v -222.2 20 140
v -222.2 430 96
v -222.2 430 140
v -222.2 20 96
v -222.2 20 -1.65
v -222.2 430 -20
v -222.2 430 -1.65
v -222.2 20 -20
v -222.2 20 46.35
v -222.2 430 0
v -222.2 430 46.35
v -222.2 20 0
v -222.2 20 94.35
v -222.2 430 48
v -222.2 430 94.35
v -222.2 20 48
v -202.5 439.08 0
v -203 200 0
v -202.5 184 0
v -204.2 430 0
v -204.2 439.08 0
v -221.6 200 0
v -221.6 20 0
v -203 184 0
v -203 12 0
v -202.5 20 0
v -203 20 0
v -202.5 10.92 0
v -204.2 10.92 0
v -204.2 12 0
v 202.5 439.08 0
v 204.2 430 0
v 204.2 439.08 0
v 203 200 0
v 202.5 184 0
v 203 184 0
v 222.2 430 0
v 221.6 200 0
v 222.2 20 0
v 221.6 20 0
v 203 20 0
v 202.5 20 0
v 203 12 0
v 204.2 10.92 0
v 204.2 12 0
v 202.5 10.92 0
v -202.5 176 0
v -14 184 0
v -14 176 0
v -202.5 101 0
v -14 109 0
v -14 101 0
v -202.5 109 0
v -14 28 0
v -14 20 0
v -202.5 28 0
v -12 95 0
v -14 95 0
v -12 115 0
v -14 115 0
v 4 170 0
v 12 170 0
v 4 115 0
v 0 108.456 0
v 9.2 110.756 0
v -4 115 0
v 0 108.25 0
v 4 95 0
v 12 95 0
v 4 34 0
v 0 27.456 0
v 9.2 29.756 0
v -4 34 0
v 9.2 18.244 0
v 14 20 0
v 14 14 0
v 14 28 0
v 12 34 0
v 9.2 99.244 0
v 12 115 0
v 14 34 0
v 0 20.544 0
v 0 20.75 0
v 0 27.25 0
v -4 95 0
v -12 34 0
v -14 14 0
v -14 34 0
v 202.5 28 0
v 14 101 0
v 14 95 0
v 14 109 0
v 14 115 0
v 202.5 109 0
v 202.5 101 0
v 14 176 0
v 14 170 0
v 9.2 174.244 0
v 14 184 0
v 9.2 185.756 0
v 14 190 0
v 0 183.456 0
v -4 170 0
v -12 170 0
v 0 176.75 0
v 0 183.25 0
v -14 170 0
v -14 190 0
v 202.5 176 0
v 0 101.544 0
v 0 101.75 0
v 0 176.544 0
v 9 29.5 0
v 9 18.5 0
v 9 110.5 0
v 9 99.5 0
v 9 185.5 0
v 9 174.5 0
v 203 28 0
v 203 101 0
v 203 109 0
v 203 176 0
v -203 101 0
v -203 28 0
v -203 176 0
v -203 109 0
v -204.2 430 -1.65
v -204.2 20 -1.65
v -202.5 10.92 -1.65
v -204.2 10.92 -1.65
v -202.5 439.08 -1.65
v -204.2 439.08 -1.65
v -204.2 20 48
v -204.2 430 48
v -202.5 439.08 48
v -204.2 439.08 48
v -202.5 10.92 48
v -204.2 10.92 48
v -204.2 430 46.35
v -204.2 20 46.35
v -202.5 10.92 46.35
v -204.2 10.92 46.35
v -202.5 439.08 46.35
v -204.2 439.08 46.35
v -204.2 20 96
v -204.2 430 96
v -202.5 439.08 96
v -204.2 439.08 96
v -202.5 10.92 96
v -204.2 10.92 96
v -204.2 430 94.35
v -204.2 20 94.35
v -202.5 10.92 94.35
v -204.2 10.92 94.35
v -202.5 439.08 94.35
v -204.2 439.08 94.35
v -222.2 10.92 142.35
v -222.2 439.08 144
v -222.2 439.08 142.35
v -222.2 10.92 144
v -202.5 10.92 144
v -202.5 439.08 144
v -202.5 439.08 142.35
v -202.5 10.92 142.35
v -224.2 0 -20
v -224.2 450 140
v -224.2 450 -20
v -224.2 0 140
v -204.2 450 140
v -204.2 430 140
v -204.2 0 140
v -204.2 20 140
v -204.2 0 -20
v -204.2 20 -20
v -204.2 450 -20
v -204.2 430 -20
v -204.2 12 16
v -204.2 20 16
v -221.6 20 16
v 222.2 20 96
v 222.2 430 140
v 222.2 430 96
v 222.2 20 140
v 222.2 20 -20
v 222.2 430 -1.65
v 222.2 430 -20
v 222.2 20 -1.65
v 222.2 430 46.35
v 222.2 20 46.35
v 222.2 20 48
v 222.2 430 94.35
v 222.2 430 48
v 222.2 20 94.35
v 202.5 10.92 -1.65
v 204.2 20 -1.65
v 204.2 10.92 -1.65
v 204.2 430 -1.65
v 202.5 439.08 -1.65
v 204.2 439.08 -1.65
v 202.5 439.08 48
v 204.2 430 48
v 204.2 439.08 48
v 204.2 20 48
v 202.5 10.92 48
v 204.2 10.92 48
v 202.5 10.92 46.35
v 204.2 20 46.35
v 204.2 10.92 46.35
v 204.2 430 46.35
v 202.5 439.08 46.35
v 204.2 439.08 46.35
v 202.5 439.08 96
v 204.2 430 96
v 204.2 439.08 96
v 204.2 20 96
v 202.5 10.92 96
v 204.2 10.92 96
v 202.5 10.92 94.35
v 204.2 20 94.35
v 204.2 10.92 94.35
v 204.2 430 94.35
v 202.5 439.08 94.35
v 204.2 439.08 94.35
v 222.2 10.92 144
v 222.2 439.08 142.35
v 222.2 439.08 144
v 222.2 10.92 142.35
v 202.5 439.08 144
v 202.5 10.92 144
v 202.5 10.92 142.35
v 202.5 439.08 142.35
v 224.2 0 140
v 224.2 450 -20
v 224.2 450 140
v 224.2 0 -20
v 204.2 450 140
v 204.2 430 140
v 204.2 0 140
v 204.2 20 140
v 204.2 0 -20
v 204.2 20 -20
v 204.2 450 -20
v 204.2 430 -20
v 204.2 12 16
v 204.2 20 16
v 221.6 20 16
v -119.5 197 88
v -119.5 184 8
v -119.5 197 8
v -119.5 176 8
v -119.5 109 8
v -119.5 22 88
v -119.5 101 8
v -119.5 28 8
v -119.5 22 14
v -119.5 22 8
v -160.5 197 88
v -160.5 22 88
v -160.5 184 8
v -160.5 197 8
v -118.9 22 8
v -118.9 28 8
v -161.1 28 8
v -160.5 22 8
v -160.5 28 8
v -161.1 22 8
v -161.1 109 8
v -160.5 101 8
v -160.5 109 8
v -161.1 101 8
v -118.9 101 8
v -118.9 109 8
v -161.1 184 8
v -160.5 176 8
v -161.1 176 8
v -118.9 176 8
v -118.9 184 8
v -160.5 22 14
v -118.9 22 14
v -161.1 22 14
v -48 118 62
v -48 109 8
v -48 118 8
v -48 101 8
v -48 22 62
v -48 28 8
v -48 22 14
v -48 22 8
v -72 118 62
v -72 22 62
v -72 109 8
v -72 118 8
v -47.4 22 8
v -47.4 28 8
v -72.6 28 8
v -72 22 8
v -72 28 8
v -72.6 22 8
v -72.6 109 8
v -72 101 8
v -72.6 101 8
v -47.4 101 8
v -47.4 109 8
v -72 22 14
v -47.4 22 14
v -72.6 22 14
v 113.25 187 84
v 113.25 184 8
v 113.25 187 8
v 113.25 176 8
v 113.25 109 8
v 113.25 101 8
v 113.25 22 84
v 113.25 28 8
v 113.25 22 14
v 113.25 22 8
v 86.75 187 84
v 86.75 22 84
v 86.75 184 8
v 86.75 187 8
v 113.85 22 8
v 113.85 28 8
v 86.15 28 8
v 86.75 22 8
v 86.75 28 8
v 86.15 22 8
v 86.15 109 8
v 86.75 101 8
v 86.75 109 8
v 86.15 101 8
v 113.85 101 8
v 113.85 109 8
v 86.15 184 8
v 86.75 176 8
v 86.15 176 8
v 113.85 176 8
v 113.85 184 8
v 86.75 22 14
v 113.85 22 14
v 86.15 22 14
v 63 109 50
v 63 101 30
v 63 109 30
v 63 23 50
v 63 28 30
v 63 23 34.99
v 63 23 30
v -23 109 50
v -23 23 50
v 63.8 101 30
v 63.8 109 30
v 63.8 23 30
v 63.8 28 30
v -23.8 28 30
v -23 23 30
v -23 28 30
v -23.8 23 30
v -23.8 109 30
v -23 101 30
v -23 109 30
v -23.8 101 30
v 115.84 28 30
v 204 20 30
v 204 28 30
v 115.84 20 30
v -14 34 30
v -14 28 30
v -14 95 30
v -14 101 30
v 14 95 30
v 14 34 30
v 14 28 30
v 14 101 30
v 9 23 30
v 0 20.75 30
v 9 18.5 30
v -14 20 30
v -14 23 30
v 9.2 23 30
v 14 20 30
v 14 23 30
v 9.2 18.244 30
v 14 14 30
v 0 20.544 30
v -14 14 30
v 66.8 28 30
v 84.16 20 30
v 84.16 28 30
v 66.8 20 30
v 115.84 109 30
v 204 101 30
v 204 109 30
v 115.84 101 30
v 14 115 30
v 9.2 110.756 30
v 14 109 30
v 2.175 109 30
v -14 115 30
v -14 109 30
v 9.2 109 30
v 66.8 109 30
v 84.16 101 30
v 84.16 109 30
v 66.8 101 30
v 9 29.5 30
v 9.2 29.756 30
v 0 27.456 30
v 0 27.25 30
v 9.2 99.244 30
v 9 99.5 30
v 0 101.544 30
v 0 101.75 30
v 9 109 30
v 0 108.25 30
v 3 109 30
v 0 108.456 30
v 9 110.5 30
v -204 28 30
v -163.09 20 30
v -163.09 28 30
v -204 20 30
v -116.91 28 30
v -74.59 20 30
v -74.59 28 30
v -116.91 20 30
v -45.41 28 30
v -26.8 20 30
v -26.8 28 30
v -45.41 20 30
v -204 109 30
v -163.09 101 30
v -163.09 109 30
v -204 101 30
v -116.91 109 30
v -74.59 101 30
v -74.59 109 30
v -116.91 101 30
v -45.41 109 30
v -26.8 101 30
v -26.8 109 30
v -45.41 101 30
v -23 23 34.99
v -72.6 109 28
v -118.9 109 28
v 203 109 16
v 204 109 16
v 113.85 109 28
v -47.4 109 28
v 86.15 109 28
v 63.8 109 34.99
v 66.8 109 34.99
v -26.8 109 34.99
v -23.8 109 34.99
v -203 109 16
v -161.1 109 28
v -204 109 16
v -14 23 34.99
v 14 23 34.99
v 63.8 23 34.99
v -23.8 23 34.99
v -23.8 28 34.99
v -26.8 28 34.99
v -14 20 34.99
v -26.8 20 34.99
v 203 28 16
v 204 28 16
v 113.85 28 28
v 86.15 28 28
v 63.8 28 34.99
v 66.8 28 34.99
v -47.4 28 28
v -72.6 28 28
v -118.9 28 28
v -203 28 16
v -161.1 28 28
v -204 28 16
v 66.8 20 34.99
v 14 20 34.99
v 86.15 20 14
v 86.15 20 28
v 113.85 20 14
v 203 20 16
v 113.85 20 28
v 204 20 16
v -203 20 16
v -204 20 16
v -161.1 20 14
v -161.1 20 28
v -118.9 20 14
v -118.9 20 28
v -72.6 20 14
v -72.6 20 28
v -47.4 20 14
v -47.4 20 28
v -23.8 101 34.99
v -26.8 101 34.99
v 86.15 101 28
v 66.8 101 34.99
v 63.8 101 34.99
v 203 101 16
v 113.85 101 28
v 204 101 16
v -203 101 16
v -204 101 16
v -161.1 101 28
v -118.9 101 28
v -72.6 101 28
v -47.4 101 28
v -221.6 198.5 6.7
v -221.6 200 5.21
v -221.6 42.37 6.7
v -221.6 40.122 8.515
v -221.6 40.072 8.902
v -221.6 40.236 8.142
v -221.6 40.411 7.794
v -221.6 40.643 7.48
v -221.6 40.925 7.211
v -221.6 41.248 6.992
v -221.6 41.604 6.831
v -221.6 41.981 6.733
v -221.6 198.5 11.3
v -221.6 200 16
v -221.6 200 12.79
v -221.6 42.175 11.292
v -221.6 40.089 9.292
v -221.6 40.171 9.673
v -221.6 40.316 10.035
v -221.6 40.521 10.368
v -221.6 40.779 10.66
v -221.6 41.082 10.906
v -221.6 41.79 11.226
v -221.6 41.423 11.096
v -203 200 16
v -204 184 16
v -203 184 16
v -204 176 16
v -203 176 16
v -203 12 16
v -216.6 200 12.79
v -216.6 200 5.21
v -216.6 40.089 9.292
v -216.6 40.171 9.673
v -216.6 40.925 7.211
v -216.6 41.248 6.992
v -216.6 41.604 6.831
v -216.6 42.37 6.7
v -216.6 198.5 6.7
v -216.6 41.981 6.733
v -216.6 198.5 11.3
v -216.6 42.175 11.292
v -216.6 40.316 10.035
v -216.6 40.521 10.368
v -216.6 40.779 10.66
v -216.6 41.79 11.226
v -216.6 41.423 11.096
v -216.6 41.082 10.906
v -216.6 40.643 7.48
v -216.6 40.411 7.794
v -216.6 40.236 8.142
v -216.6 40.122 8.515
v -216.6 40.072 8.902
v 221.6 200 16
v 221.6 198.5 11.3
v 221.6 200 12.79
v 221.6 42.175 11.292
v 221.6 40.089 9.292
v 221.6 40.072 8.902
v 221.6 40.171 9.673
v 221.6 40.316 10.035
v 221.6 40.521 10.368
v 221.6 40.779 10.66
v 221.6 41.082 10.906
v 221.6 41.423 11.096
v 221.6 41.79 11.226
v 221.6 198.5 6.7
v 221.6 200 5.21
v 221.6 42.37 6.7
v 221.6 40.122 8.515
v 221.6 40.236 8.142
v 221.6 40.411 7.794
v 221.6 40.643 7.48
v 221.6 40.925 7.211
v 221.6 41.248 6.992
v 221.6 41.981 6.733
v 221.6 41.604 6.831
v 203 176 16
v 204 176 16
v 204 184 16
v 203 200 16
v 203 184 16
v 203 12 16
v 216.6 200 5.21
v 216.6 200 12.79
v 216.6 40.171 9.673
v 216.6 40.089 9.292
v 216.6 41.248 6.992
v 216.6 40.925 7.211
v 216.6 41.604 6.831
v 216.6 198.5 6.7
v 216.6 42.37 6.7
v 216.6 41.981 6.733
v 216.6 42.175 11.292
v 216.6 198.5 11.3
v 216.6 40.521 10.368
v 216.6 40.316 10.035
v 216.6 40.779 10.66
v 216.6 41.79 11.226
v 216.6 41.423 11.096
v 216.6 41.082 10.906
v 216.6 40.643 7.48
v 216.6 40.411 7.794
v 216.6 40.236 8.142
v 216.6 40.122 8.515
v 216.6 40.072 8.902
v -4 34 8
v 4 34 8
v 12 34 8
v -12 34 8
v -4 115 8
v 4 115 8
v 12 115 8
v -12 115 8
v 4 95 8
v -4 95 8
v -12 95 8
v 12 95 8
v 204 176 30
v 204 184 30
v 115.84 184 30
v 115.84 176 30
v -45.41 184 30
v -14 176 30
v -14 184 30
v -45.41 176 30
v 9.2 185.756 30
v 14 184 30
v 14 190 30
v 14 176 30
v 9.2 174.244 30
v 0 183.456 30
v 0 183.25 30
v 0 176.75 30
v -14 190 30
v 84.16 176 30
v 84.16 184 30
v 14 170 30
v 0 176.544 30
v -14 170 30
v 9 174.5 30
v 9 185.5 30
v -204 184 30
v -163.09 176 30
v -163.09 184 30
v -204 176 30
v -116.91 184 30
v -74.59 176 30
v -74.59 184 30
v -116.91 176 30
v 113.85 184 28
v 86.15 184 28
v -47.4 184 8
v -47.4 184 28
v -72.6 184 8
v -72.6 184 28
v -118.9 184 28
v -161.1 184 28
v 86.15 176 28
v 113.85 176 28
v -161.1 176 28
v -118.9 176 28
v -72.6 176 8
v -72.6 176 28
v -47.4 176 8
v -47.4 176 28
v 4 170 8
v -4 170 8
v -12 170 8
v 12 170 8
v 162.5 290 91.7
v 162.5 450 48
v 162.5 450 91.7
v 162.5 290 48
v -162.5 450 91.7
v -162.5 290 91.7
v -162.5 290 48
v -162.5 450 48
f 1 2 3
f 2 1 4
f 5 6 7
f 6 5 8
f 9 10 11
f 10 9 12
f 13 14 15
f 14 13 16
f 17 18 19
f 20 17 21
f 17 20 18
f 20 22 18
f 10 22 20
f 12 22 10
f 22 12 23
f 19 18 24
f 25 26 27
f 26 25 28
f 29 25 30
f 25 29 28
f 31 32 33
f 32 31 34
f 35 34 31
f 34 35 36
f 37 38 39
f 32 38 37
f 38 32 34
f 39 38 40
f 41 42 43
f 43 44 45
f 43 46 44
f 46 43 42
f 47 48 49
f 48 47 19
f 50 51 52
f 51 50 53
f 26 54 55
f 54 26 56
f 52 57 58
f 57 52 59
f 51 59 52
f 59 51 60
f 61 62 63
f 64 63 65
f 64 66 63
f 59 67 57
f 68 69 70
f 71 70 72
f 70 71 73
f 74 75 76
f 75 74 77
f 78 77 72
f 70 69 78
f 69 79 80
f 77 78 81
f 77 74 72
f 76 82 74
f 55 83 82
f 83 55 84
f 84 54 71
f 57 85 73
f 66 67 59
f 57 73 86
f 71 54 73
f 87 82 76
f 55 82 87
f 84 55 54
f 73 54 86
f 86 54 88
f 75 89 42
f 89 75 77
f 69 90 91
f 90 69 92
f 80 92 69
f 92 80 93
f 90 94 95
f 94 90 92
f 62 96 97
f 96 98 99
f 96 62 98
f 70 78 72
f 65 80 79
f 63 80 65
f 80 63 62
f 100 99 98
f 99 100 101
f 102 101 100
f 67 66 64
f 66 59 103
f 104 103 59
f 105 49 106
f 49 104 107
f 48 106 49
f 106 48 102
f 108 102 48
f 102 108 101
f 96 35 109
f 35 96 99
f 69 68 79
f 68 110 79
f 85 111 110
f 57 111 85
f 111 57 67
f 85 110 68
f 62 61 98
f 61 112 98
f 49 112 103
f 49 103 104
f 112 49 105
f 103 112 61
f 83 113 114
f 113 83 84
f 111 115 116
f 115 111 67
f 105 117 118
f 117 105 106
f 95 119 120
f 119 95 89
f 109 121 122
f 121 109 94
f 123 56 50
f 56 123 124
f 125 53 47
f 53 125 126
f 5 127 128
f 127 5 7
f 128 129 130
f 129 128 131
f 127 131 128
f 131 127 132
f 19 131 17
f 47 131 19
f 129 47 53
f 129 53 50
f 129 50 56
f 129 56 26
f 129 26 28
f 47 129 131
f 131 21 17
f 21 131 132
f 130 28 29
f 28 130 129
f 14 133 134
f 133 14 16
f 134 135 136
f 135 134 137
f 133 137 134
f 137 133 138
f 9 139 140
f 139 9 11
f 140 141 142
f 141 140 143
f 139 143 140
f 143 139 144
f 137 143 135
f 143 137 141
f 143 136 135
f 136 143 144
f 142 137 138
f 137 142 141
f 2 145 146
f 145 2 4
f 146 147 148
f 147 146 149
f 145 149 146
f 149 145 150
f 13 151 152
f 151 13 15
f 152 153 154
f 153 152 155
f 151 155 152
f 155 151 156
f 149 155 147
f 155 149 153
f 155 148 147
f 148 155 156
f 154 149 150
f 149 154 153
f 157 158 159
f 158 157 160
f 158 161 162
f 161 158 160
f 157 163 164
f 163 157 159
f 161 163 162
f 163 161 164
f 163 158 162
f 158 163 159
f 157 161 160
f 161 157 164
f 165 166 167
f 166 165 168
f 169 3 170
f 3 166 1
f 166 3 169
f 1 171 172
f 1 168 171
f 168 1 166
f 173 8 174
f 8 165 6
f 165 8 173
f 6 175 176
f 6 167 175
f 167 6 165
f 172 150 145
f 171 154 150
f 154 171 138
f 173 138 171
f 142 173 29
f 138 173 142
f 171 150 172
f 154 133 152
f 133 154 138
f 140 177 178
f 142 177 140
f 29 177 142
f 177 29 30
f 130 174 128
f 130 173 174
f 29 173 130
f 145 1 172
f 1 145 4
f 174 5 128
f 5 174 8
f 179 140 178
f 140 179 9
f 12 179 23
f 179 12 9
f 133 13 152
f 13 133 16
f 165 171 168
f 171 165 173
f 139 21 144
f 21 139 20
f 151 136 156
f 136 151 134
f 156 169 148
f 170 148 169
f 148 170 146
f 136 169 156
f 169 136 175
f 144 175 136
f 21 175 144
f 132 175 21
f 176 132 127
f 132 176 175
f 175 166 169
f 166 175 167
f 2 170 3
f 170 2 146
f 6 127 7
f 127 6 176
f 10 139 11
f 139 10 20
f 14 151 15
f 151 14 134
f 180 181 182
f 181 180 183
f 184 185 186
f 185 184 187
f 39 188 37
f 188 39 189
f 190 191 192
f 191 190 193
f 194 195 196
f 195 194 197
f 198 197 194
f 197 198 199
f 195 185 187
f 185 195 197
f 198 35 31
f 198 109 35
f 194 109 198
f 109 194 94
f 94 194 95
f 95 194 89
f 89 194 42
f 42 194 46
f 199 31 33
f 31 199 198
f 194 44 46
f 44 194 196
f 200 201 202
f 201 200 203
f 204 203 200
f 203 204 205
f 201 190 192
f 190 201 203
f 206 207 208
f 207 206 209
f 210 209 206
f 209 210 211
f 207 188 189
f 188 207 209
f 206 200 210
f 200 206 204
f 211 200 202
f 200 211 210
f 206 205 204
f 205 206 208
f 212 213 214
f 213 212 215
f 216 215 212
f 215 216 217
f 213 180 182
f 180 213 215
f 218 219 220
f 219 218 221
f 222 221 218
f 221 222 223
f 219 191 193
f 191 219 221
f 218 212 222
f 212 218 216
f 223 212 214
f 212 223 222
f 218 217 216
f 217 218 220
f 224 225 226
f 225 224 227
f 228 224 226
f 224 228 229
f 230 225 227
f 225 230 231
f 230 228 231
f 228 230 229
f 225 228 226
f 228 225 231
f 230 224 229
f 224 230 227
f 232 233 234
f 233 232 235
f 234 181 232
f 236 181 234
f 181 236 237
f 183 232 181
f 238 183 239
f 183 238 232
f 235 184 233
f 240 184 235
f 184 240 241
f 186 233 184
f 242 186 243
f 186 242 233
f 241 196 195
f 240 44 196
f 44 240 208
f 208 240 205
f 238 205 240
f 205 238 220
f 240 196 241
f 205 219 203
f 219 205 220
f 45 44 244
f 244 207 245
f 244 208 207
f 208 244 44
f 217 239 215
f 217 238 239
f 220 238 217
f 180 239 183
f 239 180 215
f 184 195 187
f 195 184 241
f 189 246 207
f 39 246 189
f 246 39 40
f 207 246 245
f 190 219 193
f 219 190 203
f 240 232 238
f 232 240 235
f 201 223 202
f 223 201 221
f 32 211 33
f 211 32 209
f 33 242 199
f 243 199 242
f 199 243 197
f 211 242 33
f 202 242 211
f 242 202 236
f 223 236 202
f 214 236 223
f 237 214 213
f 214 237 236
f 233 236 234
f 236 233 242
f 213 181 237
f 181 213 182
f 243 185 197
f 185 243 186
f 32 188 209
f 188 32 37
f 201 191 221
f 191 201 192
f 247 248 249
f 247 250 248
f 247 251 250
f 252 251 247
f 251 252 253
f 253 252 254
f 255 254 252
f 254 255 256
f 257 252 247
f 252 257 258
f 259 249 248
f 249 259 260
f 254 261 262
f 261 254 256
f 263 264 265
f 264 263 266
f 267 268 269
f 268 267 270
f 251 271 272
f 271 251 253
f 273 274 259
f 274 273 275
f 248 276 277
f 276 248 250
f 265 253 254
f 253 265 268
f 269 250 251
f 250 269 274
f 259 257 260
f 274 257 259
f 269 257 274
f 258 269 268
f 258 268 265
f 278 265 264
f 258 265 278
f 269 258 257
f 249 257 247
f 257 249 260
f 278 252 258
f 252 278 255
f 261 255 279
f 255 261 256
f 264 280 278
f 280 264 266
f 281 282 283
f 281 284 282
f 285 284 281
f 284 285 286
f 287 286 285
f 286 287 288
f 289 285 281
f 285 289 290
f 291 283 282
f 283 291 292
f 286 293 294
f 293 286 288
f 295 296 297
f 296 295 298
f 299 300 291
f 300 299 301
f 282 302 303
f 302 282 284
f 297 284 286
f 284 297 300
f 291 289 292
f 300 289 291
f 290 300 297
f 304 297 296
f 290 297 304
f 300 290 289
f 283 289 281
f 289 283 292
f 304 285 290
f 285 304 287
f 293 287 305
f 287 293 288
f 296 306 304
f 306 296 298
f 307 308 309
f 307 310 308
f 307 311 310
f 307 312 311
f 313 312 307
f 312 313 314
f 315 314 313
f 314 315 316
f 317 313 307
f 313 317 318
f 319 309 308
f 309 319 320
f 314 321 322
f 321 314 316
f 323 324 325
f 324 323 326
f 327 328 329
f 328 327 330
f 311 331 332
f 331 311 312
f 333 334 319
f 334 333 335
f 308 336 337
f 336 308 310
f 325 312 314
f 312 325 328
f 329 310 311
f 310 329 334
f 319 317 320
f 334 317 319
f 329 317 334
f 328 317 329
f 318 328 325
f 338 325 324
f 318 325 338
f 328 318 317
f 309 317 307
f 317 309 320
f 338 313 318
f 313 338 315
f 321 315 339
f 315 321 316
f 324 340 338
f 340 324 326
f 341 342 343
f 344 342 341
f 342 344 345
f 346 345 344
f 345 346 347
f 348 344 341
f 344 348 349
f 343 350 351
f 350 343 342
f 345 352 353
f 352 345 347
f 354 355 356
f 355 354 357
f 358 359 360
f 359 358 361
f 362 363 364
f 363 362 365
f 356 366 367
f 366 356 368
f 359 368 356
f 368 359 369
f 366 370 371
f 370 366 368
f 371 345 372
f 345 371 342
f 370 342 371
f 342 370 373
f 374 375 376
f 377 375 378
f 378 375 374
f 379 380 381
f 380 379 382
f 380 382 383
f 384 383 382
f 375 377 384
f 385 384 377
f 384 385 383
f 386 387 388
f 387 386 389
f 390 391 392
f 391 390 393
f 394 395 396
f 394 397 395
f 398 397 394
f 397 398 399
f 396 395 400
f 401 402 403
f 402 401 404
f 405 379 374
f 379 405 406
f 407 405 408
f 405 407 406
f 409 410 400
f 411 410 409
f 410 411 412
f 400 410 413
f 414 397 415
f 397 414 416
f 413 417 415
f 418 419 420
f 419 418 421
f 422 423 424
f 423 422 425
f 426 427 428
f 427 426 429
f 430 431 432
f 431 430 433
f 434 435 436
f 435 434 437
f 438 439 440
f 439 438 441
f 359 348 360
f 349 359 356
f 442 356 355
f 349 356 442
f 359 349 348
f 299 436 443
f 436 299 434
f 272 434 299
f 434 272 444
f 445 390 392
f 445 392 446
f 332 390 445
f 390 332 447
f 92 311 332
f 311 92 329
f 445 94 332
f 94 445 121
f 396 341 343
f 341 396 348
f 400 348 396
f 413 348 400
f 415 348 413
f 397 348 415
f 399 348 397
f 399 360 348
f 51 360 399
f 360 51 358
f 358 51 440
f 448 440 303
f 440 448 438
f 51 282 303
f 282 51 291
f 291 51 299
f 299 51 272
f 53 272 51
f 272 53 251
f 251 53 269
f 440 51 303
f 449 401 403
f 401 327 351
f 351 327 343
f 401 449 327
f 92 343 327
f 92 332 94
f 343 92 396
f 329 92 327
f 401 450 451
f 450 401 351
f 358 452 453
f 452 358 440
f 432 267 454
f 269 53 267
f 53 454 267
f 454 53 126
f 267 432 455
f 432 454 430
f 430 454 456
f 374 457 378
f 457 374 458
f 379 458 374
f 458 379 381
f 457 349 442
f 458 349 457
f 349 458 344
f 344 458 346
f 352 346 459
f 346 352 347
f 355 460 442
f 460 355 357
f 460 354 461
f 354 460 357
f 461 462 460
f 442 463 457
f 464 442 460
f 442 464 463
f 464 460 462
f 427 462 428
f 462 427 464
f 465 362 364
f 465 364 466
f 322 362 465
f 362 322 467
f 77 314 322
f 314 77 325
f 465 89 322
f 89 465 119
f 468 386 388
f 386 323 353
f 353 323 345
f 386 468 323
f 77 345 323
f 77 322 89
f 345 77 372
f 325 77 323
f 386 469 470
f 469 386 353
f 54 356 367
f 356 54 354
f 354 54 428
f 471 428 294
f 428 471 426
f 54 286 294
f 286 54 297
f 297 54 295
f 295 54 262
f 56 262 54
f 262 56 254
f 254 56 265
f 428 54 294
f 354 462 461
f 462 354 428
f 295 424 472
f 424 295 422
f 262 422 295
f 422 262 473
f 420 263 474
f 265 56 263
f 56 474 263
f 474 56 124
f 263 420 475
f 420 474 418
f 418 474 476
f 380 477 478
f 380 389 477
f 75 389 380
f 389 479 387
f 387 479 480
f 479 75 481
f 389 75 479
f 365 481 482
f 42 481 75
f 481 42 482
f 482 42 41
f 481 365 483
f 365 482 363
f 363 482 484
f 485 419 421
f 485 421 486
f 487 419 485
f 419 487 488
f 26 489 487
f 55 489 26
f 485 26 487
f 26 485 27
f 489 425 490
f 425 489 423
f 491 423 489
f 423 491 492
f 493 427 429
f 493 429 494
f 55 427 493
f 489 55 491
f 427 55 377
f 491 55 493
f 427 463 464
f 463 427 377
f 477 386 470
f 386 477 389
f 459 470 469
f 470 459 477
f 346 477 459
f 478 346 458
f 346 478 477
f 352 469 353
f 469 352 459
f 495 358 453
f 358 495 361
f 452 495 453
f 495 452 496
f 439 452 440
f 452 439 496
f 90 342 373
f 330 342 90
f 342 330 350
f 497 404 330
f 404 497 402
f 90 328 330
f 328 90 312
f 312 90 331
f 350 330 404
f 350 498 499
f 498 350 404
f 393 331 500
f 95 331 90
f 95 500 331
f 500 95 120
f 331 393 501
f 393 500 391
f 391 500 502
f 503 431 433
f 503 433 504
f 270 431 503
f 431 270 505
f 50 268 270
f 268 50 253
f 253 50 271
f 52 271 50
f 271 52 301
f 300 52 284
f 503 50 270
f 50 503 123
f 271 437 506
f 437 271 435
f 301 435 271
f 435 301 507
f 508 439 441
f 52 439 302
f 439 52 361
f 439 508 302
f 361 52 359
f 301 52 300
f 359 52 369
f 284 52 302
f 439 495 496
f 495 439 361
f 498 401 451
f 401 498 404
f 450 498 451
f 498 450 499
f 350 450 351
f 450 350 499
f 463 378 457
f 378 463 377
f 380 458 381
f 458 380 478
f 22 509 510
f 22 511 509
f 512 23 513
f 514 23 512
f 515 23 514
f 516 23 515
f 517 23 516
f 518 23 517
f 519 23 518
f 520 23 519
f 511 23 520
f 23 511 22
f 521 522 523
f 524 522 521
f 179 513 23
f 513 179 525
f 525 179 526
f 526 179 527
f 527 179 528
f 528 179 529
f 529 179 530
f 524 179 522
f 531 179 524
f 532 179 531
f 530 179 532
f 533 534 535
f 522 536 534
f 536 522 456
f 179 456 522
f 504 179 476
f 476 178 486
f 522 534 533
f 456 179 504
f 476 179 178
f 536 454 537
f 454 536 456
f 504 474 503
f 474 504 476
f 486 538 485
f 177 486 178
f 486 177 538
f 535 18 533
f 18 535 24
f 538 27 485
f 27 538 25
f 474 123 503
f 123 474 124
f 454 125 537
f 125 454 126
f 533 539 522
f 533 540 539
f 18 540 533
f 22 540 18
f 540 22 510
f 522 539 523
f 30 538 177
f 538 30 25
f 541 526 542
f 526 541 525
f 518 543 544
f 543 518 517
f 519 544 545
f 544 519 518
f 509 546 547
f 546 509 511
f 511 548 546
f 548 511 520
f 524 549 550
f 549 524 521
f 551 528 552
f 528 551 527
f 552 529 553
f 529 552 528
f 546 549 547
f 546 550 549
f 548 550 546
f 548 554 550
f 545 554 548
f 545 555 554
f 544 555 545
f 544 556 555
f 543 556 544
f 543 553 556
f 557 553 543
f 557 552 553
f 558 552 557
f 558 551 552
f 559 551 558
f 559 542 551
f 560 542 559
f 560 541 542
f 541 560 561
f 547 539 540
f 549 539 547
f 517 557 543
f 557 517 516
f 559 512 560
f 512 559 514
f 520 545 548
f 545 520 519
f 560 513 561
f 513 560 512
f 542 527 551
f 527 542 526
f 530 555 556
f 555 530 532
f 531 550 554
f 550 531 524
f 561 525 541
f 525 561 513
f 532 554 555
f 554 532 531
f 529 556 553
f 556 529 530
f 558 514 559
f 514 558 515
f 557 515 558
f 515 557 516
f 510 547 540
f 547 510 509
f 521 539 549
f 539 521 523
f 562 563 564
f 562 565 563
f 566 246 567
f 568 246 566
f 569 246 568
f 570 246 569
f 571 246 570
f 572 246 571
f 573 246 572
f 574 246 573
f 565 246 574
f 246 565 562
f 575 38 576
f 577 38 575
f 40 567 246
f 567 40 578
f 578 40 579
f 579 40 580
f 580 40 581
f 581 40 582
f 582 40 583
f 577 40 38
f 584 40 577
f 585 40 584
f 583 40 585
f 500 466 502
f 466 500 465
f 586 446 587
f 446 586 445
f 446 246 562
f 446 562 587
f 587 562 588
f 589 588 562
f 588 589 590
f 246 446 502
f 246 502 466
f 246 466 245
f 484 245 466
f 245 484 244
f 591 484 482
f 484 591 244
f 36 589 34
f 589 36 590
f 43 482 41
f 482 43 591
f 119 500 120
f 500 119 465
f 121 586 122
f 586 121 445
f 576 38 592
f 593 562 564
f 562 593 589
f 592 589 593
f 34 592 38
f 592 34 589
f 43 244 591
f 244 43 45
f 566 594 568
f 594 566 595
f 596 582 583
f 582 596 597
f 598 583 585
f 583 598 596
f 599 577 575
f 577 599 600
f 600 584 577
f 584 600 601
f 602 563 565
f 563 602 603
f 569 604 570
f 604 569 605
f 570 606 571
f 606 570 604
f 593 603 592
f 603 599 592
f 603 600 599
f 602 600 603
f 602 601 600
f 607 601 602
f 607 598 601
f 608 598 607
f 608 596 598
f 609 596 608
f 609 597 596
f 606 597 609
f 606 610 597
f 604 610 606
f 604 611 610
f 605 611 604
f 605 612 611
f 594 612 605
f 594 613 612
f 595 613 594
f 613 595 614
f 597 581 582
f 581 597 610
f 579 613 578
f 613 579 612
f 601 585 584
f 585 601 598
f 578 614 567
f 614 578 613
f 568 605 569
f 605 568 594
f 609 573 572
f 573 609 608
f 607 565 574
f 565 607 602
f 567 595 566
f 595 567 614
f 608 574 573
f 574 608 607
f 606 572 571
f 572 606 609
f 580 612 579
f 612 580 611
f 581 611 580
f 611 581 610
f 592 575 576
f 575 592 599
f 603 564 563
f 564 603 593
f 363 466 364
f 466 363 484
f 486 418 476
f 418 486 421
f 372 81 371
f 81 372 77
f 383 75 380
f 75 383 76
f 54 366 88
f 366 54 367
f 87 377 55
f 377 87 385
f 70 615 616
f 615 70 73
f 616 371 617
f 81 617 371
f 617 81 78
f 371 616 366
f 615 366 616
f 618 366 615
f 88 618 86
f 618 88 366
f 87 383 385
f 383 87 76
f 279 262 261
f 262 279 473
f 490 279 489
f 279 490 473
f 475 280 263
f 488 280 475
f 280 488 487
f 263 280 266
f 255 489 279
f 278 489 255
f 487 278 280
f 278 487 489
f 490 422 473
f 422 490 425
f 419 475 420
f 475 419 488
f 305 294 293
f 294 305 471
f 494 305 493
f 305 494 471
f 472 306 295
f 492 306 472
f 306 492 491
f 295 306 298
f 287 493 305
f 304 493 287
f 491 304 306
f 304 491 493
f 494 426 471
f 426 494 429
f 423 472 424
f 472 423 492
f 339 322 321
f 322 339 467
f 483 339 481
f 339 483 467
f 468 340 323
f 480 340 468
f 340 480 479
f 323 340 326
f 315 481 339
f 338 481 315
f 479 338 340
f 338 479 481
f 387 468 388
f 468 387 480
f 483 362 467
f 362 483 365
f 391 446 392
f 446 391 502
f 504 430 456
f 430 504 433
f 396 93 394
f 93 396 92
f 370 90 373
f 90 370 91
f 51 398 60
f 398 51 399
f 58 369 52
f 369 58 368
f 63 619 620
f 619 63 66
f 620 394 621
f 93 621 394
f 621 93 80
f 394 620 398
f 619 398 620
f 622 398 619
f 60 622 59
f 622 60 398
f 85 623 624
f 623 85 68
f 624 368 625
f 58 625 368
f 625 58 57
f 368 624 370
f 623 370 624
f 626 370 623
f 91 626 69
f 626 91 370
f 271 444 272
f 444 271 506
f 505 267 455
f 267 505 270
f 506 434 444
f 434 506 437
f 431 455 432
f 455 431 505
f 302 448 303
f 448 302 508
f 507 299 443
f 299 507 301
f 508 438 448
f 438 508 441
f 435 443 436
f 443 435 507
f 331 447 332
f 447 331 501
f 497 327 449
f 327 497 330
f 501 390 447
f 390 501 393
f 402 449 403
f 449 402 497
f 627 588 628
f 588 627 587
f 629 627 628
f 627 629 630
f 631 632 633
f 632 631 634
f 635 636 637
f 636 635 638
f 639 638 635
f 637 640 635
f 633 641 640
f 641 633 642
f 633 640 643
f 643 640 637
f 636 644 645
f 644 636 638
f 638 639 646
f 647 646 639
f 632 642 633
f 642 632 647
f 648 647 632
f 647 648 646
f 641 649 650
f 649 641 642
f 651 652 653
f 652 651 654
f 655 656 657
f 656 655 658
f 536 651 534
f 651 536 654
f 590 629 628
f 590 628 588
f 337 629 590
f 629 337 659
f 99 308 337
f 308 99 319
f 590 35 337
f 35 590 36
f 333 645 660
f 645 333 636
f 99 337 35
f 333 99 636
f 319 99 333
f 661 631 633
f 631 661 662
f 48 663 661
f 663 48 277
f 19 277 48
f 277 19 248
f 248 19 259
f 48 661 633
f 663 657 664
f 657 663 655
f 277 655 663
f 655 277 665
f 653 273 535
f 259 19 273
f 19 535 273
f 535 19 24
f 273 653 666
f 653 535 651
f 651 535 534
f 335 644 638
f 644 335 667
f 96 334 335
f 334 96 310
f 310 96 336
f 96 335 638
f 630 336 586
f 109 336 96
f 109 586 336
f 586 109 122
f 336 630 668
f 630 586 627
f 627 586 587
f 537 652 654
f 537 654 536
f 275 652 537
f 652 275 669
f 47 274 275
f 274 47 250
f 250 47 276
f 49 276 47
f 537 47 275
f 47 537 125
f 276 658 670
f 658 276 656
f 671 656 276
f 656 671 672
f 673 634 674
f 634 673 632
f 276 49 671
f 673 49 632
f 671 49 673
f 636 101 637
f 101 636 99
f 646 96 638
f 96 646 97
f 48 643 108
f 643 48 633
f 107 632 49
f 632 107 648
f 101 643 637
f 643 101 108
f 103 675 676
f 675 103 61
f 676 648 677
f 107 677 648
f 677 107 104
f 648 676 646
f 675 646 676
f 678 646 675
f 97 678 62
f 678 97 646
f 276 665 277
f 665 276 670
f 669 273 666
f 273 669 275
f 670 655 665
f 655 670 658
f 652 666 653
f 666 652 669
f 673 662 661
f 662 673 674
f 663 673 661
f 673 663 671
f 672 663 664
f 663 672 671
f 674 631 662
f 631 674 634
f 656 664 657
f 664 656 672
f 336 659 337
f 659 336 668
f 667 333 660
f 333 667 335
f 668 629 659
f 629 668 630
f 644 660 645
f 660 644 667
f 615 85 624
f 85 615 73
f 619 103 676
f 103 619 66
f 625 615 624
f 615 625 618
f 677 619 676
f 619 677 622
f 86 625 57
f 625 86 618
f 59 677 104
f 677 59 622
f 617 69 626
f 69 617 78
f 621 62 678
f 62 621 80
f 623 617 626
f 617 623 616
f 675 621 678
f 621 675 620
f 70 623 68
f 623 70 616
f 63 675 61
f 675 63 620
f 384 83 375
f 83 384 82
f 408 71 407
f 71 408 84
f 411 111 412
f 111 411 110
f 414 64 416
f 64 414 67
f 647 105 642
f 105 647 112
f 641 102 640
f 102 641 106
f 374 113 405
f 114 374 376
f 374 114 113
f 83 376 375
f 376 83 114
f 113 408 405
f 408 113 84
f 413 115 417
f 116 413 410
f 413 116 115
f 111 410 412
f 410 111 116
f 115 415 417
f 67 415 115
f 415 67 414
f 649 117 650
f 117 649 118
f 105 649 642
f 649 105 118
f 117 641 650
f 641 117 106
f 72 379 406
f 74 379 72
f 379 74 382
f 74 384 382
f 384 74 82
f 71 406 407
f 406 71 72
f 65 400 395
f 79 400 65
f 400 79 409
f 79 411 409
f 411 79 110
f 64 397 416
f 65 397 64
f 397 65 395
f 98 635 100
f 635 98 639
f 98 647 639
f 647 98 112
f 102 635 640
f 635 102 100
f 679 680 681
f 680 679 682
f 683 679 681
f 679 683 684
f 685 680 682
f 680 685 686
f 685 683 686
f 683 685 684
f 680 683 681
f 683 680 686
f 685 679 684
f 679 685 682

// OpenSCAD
/* =====================================================
   Rack brick caddy — scene
   =====================================================
   Visual-only hero: the caddy in the bottom 2U at the back
   of the rack, with the three bricks standing in it, the
   power strip in the slot above and the Pro Max 16 PoE at
   the front. Simplified rack (slats, ledges, posts). PNG
   only — see build.py is_scene().
   ===================================================== */

include <rack_brick_caddy.scad>
part = "none";

rack_c  = "#b9bdc2";
depth   = 450;          // usable depth, back post to front post

// slats and ledges, bottom three slots
color(rack_c) for (s = [-1, 1]) mirror([s < 0 ? 1 : 0, 0, 0]) {
    translate([slat_x, 0, -20]) cube([2, depth, 160]);
    for (k = [0 : 3]) translate([slat_x - ledge_in, ledge_front, k * 48 - 1.65])
        cube([ledge_in, depth - 2 * ledge_front, 1.65]);
    for (y = [0, depth - 20]) translate([slat_x - 18, y, -20]) cube([20, 20, 160]);
}

// Pro Max 16 PoE at the front (the power strip in the slot above is
// left out so the bricks show)
color("#d9dadc") translate([-162.5, depth - 160, 48]) cube([325, 160, 43.7]);

// the bricks and the HDHomeRun
contents();

color("#2ab3c0") { half(-1); half(1); }

$vpt = [0, 140, 30];
$vpr = [48, 0, 335];
$vpd = 900;
